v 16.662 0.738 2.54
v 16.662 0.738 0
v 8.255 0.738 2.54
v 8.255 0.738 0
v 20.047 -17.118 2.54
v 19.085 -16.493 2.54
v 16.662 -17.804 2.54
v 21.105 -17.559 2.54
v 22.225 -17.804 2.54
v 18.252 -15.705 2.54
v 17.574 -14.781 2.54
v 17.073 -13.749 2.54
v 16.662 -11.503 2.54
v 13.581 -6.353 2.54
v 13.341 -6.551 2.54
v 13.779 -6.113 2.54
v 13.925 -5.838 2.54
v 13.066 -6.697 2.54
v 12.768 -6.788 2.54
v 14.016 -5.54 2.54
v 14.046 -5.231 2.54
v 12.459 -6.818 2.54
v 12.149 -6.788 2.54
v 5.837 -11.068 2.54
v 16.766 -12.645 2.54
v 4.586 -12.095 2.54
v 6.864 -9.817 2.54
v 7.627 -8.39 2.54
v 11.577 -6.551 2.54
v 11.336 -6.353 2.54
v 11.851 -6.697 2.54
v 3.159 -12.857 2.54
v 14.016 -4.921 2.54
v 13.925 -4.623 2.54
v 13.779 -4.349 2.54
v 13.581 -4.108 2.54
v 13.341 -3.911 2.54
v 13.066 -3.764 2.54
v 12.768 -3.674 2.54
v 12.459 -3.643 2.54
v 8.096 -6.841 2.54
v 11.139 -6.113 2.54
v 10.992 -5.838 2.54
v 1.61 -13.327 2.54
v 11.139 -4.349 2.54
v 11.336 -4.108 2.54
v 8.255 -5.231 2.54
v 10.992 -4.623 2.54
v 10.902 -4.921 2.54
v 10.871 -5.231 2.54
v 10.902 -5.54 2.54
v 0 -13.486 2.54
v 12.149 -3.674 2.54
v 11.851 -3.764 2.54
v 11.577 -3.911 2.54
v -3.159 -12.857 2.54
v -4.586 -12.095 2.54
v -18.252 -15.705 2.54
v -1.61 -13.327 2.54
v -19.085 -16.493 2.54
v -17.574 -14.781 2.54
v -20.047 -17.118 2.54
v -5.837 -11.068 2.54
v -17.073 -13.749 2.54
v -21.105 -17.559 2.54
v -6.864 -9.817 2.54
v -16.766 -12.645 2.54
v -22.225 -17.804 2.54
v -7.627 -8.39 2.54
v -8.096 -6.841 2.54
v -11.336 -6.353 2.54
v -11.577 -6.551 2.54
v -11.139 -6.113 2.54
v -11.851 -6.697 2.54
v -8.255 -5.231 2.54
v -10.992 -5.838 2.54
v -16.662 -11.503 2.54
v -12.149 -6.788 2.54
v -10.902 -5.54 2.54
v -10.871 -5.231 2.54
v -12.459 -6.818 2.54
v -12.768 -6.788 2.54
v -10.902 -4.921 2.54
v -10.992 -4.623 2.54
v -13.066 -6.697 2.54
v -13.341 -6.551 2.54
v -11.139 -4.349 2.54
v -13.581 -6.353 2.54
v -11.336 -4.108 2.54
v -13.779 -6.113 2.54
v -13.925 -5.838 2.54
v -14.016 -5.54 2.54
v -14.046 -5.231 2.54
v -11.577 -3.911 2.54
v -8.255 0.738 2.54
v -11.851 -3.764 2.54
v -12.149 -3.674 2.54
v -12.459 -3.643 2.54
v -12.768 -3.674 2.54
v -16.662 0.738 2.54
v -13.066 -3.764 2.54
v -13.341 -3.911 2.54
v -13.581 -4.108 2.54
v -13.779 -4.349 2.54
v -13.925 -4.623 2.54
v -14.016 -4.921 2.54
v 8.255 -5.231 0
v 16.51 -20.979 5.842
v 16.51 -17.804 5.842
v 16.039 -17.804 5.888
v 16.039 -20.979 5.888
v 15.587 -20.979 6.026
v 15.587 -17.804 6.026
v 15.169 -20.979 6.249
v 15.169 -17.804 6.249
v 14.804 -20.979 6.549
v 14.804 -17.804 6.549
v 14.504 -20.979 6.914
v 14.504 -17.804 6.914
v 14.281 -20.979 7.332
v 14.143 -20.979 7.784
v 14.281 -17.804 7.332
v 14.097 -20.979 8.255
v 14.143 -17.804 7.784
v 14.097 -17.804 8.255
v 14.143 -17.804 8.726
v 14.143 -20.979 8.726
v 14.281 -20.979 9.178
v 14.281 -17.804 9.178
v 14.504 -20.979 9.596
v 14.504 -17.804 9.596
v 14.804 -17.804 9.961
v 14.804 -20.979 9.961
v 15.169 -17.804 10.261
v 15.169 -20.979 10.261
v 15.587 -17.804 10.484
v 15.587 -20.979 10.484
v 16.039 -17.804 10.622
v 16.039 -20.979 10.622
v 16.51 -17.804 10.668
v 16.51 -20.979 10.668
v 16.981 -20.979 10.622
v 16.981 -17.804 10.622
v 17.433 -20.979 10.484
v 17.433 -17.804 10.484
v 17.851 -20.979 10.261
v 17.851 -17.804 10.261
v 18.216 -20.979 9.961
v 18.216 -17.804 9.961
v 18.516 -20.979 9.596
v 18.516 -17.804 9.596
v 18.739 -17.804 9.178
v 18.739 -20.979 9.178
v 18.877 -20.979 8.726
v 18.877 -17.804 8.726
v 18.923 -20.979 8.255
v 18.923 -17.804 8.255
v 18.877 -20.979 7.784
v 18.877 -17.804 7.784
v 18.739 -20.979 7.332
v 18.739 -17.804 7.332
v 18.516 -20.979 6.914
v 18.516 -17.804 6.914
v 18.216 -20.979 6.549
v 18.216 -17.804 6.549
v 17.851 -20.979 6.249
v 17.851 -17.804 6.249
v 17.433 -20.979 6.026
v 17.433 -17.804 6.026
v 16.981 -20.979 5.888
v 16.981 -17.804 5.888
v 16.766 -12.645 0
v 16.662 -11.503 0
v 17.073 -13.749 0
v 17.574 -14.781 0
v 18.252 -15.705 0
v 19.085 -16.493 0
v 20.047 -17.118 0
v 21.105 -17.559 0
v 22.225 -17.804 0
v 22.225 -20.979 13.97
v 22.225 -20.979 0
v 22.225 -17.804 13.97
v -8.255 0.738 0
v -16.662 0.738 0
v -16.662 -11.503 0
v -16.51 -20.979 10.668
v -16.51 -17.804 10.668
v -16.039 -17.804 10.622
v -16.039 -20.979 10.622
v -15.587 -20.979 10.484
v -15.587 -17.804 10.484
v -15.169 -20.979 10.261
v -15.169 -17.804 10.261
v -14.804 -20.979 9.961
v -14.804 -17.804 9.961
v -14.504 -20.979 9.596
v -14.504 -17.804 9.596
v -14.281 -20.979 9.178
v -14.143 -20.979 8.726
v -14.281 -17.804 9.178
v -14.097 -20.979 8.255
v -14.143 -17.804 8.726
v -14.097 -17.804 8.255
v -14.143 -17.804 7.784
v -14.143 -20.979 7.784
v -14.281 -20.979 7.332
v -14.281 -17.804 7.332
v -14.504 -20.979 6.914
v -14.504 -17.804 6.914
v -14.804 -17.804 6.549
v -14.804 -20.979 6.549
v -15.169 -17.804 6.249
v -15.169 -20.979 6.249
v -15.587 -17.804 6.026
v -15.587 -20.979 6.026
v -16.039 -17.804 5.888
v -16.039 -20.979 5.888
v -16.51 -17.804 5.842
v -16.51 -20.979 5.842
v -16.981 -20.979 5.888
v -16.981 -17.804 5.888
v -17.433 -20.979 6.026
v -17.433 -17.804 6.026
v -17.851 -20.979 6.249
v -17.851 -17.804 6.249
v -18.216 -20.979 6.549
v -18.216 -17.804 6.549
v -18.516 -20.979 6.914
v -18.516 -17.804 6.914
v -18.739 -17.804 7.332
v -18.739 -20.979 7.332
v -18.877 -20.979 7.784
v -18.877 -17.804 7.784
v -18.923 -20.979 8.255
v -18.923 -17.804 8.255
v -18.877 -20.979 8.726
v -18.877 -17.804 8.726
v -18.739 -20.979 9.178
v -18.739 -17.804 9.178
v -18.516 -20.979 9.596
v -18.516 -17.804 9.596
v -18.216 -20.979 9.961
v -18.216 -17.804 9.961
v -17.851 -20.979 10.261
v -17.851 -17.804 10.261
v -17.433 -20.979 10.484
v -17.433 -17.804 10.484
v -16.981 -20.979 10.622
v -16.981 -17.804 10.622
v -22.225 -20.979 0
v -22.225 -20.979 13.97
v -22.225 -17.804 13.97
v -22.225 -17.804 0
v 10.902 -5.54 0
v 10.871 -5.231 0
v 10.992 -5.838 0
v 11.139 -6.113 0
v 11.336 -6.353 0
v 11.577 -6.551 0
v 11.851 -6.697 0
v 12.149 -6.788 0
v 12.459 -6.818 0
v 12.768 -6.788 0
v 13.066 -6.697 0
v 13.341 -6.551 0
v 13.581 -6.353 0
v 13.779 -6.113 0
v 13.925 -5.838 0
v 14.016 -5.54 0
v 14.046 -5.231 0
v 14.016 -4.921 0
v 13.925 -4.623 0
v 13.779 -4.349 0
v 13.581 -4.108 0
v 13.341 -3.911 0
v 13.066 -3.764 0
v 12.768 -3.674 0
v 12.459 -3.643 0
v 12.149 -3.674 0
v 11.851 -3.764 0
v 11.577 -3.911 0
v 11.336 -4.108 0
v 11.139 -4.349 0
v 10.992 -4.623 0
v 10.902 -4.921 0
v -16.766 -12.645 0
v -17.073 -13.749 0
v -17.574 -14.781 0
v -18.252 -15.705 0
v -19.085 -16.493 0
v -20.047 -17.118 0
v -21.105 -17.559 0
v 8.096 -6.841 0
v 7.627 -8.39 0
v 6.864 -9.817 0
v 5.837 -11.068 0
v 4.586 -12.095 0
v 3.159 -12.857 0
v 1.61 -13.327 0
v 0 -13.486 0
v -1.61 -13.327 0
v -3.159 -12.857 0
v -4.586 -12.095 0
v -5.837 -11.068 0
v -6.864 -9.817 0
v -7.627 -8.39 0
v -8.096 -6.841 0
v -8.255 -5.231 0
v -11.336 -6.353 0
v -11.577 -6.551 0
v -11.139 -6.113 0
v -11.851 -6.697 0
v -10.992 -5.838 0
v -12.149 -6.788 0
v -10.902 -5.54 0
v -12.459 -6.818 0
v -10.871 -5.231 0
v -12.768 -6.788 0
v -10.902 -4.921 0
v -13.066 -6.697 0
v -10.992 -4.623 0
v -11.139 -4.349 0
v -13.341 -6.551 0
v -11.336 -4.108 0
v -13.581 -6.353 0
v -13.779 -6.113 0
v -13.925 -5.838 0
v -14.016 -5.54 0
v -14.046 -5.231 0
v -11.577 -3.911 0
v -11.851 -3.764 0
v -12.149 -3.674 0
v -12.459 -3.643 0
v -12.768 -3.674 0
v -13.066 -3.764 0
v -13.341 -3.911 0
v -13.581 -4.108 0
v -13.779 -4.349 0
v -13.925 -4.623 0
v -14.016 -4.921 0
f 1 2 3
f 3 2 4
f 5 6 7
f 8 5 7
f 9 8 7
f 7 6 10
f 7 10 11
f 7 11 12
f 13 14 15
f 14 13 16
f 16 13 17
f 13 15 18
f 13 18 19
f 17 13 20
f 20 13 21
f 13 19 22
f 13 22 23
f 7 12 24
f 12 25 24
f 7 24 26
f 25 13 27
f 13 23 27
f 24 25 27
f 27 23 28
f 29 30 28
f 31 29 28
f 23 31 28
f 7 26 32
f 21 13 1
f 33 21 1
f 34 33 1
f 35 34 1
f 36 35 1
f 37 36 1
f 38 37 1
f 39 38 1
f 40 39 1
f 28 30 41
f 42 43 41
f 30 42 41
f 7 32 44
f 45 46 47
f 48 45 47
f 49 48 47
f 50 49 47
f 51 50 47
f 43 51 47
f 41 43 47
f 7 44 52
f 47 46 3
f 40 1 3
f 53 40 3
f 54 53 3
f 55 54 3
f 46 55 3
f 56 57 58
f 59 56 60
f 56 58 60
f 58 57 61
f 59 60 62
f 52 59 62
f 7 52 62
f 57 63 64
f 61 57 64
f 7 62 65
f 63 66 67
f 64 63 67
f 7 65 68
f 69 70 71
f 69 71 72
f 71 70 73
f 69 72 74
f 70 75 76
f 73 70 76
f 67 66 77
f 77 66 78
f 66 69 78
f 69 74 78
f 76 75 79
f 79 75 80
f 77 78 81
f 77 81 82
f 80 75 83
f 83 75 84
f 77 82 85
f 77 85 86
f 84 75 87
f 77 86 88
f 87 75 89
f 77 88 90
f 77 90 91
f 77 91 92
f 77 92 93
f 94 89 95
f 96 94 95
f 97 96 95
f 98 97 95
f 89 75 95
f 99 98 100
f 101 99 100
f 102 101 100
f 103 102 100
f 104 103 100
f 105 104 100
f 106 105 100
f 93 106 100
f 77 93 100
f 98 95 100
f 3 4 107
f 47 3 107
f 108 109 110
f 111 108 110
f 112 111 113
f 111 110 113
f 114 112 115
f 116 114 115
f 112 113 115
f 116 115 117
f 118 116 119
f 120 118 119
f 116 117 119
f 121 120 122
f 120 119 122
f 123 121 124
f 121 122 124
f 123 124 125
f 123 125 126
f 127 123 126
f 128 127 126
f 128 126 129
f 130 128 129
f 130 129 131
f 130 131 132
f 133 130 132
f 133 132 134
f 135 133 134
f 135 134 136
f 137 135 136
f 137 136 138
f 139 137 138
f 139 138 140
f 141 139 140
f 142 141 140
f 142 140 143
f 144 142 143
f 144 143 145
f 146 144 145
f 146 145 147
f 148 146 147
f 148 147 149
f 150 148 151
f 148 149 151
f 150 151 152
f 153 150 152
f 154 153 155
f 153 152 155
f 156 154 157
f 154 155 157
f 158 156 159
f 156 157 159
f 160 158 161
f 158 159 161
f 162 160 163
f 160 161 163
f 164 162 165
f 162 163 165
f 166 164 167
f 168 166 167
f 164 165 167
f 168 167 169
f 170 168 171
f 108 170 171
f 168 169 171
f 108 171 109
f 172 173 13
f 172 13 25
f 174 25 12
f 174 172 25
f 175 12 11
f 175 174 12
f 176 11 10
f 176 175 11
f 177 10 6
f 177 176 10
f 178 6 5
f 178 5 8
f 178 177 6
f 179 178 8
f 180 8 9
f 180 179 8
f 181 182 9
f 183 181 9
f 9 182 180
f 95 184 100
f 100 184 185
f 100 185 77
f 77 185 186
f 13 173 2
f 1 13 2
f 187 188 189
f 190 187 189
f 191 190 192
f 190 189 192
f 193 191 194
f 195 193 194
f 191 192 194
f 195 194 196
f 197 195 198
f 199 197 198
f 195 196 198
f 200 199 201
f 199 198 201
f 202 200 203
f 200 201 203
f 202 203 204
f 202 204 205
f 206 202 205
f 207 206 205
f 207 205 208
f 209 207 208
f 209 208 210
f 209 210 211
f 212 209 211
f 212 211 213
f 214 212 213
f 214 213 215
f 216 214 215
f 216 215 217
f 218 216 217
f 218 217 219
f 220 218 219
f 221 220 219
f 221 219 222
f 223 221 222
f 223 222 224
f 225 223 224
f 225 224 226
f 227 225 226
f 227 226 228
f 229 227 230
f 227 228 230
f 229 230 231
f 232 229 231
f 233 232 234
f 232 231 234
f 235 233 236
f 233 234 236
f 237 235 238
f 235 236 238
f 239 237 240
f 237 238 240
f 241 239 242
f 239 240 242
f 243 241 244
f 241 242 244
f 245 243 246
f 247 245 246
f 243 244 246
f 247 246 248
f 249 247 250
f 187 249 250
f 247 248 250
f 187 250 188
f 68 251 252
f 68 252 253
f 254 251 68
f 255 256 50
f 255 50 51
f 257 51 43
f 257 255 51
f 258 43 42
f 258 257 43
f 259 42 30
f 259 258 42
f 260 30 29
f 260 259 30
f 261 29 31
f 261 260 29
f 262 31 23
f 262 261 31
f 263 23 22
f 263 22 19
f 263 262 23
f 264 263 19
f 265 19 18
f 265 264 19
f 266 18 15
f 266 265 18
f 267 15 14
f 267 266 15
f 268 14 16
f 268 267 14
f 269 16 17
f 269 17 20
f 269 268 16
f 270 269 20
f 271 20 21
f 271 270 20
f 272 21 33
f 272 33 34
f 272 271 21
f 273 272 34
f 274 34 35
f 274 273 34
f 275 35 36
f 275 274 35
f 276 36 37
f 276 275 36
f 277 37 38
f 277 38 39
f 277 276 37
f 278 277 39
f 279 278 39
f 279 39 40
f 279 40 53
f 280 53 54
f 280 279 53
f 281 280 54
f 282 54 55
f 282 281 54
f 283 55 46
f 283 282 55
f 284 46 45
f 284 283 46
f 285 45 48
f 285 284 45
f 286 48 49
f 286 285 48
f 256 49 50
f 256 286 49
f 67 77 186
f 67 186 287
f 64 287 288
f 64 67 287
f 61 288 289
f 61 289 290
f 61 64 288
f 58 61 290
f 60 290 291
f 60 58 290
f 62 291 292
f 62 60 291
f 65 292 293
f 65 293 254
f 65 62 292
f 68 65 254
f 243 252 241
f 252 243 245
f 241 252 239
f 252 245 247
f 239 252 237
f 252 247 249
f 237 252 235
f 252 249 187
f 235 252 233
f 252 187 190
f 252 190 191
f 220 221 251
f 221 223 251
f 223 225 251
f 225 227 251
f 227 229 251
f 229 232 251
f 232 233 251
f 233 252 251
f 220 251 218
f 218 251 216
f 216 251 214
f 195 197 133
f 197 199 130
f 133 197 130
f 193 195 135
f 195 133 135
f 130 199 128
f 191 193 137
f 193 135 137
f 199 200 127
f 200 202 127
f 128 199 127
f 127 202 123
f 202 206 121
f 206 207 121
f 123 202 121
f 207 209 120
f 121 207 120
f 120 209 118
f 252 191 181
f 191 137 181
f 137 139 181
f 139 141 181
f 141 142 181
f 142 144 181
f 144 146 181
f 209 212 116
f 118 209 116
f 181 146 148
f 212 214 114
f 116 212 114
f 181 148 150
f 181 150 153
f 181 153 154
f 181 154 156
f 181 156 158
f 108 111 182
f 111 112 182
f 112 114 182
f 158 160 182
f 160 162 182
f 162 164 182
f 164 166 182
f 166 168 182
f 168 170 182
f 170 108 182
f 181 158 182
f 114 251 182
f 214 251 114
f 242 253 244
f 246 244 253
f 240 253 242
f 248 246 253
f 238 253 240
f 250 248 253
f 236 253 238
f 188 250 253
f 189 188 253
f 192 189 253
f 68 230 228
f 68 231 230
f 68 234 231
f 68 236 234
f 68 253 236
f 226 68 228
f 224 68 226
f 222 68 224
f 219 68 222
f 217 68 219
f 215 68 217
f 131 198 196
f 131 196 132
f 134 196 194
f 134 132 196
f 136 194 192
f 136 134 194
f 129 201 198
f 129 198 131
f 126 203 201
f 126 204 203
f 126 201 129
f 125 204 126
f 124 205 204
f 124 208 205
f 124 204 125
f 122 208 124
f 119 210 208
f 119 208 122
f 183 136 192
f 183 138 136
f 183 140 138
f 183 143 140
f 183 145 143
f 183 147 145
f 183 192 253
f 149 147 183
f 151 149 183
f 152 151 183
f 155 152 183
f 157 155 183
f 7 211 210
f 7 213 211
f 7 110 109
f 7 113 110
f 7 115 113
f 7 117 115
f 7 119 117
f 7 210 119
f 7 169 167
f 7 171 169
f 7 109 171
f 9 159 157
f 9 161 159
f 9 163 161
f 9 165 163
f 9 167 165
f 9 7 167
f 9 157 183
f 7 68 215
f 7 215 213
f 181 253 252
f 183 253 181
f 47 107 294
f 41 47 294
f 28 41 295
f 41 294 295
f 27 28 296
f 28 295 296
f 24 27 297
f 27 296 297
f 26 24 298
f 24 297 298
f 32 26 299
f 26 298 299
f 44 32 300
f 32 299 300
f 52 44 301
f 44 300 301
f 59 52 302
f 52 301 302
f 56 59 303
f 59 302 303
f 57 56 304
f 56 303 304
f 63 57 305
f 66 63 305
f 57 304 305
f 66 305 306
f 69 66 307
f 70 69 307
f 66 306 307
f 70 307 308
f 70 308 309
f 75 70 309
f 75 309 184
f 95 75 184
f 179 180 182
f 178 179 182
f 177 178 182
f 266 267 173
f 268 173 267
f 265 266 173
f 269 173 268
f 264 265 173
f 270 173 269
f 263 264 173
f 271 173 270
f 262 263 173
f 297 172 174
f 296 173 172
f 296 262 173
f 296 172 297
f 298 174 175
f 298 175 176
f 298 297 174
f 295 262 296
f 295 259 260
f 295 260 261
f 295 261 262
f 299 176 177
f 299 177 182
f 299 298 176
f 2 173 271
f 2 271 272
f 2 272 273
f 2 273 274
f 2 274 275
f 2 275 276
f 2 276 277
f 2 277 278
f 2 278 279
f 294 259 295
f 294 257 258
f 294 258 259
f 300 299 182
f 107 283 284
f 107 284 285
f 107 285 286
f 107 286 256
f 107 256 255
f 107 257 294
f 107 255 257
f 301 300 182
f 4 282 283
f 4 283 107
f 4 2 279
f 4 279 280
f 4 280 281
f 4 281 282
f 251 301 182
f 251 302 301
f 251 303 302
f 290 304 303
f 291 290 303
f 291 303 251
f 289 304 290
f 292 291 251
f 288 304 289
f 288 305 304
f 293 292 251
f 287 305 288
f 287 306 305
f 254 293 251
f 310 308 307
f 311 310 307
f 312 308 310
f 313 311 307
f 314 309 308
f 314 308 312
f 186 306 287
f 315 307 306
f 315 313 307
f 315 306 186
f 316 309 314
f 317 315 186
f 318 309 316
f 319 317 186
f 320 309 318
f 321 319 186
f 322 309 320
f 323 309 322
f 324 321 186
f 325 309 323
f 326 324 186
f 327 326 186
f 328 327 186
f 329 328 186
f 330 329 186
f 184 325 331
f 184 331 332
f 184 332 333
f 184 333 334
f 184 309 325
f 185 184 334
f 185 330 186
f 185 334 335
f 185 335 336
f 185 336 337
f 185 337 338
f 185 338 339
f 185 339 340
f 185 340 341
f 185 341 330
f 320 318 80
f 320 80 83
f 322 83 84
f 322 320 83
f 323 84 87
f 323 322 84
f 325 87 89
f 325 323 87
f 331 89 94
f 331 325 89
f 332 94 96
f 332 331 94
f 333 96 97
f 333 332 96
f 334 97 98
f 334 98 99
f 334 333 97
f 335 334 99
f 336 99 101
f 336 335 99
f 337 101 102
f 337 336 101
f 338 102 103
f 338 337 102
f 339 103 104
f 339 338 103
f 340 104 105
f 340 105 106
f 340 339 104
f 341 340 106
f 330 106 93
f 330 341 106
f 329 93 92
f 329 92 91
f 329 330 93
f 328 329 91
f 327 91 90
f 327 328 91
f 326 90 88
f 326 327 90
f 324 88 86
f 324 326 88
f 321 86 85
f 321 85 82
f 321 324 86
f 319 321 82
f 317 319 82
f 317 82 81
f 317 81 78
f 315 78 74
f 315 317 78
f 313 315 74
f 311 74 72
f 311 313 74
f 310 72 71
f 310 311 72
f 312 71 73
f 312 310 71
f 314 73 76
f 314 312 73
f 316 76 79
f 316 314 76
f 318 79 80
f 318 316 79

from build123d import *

# Parameters (mm, degrees)
SKETCH1_R                = 1.5875
BOSS_EXTRUDE1_DEPTH      = 2.54
BOSS_EXTRUDE2_DEPTH      = 11.43
BOSS_EXTRUDE2_DEPTH_BACK = 2.54
SKETCH2_W                = 44.45
SKETCH2_H                = 3.175
SKETCH3_R                = 2.413
CUT_EXTRUDE1_DEPTH       = 33.139163755
FILLET1_R                = 6.35


with BuildPart() as part:
    # Sketch1 → Boss-Extrude1 (new body)
    with BuildSketch(Plane.XY):
        with BuildLine():
            Line((-8.255, -5.230769231), (-8.255, 0.738461538))
            Line((-8.255, 0.738461538), (-16.6624, 0.738461538))
            Line((-16.6624, 0.738461538), (-16.6624, -5.230769231))
            Line((-16.6624, -5.230769231), (-16.6624, -20.978769231))
            Line((-16.6624, -20.978769231), (16.6624, -20.978769231))
            Line((16.6624, -20.978769231), (16.6624, -5.230769231))
            Line((16.6624, -5.230769231), (16.6624, 0.738461538))
            Line((16.6624, 0.738461538), (8.255, 0.738461538))
            Line((8.255, 0.738461538), (8.255, -5.230769231))
            ThreePointArc((8.255, -5.230769231), (0, -13.485769231), (-8.255, -5.230769231))
        make_face()
        with Locations((-12.4587, -5.230769231)):
            Circle(SKETCH1_R, mode=Mode.SUBTRACT)
        with Locations(Location((12.4587, -5.230769231, 0), (0, 0, 180))):
            Circle(SKETCH1_R, mode=Mode.SUBTRACT)
    extrude(amount=BOSS_EXTRUDE1_DEPTH)

    # Sketch2 → Boss-Extrude2 (add, two sides: drawn at the far end of the back side and taken through both)
    with BuildSketch(Plane.XY.offset(2.54).offset(-BOSS_EXTRUDE2_DEPTH_BACK)):
        with Locations((0, -19.391269231)):
            Rectangle(SKETCH2_W, SKETCH2_H)
    extrude(amount=BOSS_EXTRUDE2_DEPTH + BOSS_EXTRUDE2_DEPTH_BACK)

    # Sketch3 → Cut-Extrude1 (cut, through all)
    with BuildSketch(Plane(origin=(0, -17.803769231, 0), x_dir=(1, 0, 0), z_dir=(0, 1, 0))):
        with Locations(Location((-16.51, -8.255, 0), (0, 0, 270))):
            Circle(SKETCH3_R)
        with Locations(Location((16.51, -8.255, 0), (0, 0, 90))):
            Circle(SKETCH3_R)
    extrude(amount=-CUT_EXTRUDE1_DEPTH, mode=Mode.SUBTRACT)

    # Fillet1
    # the kernel refuses this fillet: 6.35 mm, written as the material it adds along each edge
    with BuildSketch(Plane(origin=(-16.6624, -17.803769231, 2.54), x_dir=(0, 1, 0), z_dir=(0, 0, -1))) as fillet1_piece_1:
        with BuildLine():
            CenterArc((6.300992084, -6.35), FILLET1_R, 90, 82.87698928)
            Line((0, -5.5626), (-0.126019842, -5.546852))
            ThreePointArc((-0.126019842, -5.546852), (-0.127, -2.7813), (-0.127, 0))
            Line((-0.127, 0), (0, 0.127))
            Line((0, 0.127), (6.300992084, 0.127))
            Line((6.300992084, 0.127), (6.300992084, 0))
        make_face()
    extrude(amount=2.54)
    with BuildSketch(Plane(origin=(16.6624, -17.803769231, 0), x_dir=(1, 0, 0), z_dir=(0, 0, 1))) as fillet1_piece_2:
        with BuildLine():
            CenterArc((6.35, 6.300992084), FILLET1_R, 180, 82.87698928)
            Line((0, 6.300992084), (-0.127, 6.300992084))
            Line((-0.127, 6.300992084), (-0.127, 0))
            Line((-0.127, 0), (0, -0.127))
            ThreePointArc((0, -0.127), (2.7813, -0.127), (5.546852, -0.126019842))
            Line((5.546852, -0.126019842), (5.5626, 0))
        make_face()
    extrude(amount=2.54)


solid = part.part
